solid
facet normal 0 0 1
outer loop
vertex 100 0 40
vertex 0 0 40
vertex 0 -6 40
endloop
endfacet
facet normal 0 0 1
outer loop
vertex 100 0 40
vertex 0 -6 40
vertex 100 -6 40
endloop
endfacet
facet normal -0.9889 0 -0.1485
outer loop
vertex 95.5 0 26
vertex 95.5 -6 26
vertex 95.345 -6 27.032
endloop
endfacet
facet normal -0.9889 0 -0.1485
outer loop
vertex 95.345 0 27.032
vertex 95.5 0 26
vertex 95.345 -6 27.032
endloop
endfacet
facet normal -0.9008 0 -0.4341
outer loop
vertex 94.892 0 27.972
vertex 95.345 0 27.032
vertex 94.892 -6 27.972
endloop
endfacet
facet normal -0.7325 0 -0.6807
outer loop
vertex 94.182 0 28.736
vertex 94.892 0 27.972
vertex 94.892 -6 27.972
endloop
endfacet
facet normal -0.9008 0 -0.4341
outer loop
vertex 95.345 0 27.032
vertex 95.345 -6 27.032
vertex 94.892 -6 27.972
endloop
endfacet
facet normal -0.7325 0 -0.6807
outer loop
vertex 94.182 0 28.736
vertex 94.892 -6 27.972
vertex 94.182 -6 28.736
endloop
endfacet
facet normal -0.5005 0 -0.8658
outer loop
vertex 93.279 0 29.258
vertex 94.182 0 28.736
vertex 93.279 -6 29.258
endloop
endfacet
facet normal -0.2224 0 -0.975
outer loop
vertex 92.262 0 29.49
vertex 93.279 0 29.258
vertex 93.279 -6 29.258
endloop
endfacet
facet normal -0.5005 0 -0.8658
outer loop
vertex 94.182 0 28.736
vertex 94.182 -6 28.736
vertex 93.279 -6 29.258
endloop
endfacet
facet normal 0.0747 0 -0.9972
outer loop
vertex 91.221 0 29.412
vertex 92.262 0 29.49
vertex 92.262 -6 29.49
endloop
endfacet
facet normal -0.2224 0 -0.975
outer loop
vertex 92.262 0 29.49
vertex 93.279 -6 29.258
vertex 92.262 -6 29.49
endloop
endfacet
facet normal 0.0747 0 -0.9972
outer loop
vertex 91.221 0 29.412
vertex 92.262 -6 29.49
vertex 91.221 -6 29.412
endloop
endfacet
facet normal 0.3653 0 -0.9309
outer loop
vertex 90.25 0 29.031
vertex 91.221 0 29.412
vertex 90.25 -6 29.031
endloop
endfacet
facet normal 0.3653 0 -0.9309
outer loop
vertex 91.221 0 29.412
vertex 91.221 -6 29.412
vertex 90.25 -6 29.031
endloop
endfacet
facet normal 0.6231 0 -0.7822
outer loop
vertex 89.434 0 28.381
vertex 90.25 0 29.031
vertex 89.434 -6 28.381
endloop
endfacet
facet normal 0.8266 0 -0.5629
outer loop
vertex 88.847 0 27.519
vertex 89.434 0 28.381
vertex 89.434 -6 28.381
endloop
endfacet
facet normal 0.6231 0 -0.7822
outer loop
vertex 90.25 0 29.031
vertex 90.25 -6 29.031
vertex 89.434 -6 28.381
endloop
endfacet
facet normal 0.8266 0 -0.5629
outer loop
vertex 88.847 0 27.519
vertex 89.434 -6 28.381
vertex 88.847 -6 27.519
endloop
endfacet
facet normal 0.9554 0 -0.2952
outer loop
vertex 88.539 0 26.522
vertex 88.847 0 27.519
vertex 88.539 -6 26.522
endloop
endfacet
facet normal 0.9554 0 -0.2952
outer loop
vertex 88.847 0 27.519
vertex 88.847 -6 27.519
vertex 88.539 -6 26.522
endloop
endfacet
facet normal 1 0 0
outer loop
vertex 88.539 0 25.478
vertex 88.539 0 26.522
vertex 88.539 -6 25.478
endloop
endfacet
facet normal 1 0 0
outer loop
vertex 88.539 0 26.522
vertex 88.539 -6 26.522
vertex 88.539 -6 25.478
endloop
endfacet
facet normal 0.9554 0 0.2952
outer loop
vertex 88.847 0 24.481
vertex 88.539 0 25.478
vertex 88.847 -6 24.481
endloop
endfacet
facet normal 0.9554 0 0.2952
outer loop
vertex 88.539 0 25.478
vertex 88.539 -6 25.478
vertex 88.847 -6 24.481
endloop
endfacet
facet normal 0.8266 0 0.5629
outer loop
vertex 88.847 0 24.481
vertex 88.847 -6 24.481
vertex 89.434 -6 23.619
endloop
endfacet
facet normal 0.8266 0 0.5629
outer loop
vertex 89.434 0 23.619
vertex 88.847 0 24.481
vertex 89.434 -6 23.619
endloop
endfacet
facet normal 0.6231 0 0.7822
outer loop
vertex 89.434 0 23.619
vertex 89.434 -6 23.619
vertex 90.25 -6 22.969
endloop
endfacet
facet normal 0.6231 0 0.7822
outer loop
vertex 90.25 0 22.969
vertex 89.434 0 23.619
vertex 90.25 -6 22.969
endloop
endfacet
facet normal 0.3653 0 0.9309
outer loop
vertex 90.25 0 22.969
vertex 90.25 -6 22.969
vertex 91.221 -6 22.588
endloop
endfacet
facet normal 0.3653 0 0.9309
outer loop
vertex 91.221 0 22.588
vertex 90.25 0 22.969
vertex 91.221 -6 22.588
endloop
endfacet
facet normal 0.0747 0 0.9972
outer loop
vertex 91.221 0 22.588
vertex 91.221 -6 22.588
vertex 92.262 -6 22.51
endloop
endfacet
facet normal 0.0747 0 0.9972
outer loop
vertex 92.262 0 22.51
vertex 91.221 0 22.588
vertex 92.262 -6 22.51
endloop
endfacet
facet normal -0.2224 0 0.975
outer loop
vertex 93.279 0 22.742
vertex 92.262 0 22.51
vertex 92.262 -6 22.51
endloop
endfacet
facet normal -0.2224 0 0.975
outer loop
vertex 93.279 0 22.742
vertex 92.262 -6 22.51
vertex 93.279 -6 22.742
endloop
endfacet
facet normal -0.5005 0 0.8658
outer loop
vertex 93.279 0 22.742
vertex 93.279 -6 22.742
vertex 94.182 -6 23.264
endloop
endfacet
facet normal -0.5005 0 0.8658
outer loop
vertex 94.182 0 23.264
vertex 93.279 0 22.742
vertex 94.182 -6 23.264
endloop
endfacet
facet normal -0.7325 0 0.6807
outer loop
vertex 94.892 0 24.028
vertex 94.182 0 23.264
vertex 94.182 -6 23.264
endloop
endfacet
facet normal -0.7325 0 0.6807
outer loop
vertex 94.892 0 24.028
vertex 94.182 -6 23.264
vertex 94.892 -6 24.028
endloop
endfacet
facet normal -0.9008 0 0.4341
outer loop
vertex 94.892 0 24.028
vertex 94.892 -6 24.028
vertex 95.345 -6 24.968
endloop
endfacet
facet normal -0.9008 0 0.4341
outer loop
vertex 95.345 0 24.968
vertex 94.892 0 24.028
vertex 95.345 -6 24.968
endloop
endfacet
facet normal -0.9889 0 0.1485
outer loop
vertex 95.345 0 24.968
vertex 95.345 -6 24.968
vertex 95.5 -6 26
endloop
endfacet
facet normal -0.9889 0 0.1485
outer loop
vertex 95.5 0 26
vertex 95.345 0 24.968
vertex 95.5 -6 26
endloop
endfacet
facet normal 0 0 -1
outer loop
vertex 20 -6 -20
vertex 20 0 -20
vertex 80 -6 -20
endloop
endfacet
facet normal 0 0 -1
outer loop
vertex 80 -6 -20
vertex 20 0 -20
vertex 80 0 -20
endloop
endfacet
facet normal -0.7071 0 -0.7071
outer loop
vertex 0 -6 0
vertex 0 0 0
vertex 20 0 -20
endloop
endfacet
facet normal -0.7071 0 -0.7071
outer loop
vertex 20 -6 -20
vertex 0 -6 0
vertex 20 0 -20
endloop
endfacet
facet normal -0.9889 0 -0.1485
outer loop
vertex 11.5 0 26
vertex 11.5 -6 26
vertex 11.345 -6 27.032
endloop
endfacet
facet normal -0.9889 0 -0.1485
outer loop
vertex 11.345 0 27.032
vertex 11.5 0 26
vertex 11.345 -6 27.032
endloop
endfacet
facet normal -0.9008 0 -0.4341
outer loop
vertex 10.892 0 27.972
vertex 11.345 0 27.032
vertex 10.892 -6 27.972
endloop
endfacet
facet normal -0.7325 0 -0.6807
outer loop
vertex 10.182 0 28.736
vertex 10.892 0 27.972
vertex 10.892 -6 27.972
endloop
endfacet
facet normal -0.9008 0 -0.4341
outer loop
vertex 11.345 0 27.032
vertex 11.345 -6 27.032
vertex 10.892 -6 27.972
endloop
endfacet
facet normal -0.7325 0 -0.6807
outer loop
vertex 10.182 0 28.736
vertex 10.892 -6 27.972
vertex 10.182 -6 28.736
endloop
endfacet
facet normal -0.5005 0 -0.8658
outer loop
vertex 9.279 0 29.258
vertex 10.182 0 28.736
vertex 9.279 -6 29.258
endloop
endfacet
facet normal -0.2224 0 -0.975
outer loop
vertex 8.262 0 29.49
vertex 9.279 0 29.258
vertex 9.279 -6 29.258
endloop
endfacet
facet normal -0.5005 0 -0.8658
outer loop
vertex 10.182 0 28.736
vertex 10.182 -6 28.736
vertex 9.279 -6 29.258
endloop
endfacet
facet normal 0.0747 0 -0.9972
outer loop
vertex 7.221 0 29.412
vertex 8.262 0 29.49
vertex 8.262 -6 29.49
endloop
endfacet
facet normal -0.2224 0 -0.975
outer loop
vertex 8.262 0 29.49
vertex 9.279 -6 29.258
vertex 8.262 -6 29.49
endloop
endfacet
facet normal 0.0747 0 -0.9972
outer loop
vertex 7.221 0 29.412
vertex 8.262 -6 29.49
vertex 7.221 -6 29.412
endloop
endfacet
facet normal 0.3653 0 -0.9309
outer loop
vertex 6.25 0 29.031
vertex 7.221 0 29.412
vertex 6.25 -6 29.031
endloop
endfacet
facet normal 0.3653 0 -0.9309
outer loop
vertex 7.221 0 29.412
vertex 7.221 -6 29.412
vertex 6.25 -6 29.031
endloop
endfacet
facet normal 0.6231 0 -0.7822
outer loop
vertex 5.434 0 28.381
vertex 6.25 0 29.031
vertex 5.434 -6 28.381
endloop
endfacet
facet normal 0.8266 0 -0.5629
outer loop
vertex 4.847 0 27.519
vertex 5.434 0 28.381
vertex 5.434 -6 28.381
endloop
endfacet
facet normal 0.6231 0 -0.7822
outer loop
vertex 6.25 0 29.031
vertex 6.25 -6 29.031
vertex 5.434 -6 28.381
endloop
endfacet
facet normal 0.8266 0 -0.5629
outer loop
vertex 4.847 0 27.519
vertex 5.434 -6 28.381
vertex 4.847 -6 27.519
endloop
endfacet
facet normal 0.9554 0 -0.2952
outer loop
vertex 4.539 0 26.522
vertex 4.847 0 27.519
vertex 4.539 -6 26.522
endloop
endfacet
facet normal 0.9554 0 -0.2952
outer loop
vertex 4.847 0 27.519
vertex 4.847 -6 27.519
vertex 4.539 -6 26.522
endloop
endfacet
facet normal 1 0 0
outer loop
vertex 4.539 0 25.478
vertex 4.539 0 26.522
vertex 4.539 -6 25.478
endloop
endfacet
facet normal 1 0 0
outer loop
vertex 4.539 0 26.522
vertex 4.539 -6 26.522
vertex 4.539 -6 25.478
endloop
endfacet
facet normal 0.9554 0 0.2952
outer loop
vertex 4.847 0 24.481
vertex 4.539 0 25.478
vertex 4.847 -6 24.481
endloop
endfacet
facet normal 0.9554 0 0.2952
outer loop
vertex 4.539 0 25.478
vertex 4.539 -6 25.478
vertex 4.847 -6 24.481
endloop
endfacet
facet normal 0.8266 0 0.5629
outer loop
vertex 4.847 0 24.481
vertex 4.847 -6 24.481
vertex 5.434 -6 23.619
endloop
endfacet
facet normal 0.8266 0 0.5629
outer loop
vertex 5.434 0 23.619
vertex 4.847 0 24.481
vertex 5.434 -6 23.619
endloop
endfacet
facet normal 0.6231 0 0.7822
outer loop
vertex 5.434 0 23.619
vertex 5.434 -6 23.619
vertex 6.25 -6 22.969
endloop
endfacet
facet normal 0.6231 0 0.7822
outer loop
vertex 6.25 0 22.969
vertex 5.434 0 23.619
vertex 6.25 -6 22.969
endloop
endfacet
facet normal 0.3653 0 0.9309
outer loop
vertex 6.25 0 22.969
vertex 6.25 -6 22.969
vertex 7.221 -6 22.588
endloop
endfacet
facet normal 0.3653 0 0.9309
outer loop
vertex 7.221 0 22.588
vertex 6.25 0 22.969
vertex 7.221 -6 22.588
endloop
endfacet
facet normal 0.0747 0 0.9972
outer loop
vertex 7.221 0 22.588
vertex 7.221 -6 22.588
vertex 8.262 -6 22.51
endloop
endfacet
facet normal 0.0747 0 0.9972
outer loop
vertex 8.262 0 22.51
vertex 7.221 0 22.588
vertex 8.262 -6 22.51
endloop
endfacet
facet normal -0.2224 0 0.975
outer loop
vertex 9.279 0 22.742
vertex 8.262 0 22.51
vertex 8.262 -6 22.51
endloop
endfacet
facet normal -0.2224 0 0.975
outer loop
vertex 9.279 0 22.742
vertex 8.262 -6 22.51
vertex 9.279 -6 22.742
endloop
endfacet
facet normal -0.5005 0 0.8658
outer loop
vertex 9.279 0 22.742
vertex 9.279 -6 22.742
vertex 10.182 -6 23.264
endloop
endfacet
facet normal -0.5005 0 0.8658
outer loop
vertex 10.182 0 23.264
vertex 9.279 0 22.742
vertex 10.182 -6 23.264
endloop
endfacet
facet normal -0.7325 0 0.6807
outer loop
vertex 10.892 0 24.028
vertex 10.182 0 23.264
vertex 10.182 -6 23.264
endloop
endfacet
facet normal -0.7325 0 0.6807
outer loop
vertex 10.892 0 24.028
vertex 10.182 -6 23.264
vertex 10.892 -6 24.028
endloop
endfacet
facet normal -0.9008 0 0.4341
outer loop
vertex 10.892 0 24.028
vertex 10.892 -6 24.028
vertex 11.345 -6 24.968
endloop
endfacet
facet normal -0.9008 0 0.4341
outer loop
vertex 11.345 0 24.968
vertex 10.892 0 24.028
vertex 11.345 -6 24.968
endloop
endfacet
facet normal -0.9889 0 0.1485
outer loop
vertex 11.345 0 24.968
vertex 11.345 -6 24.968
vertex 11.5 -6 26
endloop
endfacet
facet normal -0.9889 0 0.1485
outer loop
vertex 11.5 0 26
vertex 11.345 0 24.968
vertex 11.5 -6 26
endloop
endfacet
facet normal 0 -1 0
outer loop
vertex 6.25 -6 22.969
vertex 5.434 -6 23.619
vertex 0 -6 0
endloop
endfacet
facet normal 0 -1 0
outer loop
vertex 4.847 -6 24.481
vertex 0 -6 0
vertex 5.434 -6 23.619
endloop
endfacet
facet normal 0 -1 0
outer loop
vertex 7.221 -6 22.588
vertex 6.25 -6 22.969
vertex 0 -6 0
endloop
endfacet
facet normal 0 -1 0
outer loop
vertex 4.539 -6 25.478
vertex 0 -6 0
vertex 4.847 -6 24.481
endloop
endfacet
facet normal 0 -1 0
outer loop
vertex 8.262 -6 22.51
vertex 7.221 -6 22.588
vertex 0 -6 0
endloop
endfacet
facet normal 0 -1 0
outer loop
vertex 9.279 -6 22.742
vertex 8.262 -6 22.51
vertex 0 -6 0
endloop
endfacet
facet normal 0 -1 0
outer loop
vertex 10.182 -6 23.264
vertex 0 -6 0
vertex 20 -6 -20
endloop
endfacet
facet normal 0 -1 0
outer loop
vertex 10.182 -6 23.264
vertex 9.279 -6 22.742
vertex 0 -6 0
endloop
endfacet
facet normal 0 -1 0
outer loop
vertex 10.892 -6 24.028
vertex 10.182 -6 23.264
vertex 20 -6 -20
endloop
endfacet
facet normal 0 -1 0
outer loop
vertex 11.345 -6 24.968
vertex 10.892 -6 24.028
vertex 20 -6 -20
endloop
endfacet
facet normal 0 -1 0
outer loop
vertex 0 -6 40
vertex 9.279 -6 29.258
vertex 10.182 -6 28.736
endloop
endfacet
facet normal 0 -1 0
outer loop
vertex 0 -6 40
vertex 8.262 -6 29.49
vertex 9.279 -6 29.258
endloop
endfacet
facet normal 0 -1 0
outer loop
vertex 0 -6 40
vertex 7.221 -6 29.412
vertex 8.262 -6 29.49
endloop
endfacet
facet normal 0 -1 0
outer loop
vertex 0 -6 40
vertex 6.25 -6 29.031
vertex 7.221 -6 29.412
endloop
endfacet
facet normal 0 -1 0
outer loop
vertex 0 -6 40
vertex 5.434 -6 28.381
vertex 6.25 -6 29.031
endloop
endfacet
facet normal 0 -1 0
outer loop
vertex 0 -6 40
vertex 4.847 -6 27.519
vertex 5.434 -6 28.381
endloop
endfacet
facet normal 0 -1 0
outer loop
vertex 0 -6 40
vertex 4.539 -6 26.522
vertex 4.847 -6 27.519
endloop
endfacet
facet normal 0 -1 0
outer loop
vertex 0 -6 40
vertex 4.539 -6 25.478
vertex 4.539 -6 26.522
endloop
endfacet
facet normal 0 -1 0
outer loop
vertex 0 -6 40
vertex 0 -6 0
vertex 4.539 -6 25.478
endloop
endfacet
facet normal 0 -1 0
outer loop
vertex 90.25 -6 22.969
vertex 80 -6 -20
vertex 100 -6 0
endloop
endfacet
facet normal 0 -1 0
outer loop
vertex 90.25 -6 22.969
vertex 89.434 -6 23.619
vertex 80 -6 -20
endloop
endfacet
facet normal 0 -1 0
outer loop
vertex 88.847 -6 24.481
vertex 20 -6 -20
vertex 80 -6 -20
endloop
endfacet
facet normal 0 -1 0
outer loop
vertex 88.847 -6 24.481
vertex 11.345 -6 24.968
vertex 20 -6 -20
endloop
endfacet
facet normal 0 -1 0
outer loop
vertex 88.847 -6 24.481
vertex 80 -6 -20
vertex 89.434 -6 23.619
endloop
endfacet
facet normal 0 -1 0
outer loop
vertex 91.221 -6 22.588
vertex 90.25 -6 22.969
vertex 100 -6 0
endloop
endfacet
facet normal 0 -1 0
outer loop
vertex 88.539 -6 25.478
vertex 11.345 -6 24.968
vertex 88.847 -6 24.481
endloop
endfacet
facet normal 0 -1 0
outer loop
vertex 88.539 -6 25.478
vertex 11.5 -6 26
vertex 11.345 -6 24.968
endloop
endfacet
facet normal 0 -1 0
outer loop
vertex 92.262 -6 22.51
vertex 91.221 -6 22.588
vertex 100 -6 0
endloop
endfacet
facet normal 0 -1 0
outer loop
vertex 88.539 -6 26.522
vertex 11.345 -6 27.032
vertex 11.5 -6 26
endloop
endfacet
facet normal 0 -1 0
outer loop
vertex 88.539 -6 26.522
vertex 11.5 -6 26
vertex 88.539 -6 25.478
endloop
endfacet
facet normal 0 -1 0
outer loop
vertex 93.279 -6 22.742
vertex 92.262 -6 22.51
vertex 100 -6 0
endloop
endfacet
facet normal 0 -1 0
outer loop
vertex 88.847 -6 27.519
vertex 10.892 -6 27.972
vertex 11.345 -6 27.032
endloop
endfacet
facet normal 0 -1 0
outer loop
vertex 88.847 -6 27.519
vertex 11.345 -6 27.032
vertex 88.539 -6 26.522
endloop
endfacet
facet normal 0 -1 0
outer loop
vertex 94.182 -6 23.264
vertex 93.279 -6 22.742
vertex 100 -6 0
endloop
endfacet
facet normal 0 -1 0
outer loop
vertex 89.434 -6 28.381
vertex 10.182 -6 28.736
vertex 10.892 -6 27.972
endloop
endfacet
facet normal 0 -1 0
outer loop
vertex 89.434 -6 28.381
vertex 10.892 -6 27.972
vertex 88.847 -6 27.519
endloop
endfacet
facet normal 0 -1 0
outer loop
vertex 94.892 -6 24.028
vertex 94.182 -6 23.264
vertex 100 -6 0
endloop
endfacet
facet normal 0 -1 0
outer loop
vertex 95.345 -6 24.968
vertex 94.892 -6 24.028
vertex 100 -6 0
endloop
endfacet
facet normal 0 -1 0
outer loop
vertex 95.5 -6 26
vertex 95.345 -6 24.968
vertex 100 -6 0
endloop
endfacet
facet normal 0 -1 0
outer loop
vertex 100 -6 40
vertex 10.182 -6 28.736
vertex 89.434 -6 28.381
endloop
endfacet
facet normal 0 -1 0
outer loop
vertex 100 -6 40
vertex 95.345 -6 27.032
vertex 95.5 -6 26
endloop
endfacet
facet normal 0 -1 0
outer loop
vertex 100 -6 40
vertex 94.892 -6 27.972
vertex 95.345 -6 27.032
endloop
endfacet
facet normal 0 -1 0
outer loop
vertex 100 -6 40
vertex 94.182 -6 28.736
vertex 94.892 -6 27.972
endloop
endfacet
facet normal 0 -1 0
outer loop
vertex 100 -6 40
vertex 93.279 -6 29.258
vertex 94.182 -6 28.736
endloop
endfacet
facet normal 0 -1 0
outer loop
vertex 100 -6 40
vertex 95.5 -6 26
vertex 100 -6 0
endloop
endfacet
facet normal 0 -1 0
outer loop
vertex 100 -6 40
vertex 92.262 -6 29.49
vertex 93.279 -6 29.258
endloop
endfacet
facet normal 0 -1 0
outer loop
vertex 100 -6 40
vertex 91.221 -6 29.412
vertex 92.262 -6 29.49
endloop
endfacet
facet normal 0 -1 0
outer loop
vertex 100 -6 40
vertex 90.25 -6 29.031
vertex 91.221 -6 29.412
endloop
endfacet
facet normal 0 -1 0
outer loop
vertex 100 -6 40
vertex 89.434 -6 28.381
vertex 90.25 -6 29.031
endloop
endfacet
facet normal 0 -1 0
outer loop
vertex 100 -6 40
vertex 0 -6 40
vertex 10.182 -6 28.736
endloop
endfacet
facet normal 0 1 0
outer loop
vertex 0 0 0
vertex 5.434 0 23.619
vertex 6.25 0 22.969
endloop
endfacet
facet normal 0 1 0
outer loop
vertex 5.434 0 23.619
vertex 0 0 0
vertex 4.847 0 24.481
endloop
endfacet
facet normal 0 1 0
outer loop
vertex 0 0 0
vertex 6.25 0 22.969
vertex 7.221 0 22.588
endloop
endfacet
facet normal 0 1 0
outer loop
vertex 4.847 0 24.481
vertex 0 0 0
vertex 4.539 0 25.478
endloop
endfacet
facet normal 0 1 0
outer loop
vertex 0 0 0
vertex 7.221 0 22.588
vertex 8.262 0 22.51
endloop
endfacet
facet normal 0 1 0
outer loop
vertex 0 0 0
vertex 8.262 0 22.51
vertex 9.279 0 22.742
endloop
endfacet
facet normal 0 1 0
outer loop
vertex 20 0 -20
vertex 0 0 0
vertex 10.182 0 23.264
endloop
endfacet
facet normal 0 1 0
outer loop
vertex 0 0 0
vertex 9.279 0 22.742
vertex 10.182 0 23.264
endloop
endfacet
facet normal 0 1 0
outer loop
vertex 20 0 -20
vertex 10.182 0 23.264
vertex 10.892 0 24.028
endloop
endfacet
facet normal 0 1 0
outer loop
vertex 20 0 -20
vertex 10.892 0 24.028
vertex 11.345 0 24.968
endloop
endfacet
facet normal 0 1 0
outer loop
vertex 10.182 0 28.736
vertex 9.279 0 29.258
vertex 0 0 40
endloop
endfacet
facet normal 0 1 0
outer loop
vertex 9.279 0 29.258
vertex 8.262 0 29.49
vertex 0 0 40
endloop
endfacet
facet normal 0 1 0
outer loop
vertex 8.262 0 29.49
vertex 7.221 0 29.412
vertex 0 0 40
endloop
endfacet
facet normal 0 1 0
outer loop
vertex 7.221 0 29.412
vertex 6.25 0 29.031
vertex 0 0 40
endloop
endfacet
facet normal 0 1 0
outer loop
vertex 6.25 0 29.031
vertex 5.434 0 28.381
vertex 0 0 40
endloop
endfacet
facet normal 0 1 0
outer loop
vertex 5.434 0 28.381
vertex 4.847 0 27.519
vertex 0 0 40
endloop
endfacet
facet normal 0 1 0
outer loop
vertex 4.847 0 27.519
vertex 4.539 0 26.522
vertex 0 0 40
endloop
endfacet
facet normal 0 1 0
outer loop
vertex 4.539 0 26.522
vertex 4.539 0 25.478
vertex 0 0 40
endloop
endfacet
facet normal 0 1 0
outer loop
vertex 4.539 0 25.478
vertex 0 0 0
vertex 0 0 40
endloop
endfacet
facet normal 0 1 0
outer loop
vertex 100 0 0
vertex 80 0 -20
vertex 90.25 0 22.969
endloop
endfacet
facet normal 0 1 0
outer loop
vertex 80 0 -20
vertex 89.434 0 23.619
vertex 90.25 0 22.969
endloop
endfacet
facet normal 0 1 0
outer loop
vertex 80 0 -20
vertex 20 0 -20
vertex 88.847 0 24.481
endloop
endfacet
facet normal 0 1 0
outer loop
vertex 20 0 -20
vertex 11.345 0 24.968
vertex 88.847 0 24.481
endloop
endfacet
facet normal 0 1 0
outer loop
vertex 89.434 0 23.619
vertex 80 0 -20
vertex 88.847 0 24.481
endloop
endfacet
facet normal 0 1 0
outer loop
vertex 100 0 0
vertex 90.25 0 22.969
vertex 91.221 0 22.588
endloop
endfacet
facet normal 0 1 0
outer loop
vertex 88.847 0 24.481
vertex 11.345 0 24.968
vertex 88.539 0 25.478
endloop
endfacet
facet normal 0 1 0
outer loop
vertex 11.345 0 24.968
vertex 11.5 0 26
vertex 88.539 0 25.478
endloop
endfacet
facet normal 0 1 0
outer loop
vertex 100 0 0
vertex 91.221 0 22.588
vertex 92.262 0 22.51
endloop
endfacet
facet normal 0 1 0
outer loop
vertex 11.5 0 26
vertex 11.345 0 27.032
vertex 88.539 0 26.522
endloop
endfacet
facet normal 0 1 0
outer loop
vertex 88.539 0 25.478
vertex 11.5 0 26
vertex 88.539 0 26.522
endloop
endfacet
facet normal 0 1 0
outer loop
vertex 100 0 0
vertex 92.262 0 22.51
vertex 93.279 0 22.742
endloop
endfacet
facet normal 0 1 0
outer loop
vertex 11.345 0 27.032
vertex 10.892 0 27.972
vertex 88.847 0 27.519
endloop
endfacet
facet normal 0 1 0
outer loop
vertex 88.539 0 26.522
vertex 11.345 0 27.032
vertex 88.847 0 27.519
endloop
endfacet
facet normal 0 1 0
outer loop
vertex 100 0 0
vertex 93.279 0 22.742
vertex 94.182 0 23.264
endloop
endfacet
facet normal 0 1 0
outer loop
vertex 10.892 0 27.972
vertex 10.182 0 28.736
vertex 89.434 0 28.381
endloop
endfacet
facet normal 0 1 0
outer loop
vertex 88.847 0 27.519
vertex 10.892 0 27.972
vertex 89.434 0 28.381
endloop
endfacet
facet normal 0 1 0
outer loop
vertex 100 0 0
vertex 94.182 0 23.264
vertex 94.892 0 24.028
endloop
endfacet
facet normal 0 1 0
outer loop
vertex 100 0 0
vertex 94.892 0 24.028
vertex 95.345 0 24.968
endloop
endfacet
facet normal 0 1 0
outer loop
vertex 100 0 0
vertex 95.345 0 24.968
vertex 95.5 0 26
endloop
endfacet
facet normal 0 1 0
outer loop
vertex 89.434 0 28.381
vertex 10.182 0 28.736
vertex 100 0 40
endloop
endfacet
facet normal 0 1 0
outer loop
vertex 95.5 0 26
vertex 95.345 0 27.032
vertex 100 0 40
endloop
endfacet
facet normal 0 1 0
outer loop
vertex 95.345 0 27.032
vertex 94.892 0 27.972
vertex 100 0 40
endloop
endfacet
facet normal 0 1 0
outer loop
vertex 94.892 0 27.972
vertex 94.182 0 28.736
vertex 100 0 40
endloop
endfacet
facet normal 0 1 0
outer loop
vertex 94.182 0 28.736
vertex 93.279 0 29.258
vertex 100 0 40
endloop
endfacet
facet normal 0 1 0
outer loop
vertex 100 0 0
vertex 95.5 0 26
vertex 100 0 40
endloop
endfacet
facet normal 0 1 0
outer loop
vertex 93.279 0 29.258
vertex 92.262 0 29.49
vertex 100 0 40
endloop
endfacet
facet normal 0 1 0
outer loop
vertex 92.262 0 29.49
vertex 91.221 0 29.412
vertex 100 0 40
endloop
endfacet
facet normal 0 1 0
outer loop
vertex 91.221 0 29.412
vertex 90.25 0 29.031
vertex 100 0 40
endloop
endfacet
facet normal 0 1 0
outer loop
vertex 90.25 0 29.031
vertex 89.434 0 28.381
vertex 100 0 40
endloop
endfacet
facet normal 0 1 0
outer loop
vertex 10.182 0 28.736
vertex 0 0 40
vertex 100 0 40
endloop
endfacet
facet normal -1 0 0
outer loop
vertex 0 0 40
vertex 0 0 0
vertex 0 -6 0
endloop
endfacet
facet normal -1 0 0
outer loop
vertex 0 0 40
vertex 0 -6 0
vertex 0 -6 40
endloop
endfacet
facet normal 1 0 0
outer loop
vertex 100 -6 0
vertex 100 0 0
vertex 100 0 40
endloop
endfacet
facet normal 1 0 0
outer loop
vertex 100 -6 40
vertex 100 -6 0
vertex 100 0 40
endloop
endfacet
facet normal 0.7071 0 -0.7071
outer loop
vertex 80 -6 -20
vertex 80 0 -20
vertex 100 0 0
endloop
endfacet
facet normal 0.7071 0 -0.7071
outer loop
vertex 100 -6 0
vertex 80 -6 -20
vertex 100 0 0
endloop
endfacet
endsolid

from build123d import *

# Parameters (mm, degrees)
F0_W     = 100
F0_H     = 40
F1_DEPTH = 6
F2_R     = 3.5
F3_DEPTH = 6.001


with BuildPart() as f1:
    # F0 (on Front) → F1 (new body)
    with BuildSketch(Plane.XZ):
        with Locations((50, 20)):
            Rectangle(F0_W, F0_H)
        Polygon((100, 0), (0, 0), (20, -20), (80, -20), align=None)
    extrude(amount=F1_DEPTH)

    # F2 (on face) → F3 (cut, through all)
    with BuildSketch(Plane.XZ.offset(6)):
        with Locations((8, 26)):
            Circle(F2_R)
        with Locations((92, 26)):
            Circle(F2_R)
    extrude(amount=-F3_DEPTH, mode=Mode.SUBTRACT)


solid = f1.part
